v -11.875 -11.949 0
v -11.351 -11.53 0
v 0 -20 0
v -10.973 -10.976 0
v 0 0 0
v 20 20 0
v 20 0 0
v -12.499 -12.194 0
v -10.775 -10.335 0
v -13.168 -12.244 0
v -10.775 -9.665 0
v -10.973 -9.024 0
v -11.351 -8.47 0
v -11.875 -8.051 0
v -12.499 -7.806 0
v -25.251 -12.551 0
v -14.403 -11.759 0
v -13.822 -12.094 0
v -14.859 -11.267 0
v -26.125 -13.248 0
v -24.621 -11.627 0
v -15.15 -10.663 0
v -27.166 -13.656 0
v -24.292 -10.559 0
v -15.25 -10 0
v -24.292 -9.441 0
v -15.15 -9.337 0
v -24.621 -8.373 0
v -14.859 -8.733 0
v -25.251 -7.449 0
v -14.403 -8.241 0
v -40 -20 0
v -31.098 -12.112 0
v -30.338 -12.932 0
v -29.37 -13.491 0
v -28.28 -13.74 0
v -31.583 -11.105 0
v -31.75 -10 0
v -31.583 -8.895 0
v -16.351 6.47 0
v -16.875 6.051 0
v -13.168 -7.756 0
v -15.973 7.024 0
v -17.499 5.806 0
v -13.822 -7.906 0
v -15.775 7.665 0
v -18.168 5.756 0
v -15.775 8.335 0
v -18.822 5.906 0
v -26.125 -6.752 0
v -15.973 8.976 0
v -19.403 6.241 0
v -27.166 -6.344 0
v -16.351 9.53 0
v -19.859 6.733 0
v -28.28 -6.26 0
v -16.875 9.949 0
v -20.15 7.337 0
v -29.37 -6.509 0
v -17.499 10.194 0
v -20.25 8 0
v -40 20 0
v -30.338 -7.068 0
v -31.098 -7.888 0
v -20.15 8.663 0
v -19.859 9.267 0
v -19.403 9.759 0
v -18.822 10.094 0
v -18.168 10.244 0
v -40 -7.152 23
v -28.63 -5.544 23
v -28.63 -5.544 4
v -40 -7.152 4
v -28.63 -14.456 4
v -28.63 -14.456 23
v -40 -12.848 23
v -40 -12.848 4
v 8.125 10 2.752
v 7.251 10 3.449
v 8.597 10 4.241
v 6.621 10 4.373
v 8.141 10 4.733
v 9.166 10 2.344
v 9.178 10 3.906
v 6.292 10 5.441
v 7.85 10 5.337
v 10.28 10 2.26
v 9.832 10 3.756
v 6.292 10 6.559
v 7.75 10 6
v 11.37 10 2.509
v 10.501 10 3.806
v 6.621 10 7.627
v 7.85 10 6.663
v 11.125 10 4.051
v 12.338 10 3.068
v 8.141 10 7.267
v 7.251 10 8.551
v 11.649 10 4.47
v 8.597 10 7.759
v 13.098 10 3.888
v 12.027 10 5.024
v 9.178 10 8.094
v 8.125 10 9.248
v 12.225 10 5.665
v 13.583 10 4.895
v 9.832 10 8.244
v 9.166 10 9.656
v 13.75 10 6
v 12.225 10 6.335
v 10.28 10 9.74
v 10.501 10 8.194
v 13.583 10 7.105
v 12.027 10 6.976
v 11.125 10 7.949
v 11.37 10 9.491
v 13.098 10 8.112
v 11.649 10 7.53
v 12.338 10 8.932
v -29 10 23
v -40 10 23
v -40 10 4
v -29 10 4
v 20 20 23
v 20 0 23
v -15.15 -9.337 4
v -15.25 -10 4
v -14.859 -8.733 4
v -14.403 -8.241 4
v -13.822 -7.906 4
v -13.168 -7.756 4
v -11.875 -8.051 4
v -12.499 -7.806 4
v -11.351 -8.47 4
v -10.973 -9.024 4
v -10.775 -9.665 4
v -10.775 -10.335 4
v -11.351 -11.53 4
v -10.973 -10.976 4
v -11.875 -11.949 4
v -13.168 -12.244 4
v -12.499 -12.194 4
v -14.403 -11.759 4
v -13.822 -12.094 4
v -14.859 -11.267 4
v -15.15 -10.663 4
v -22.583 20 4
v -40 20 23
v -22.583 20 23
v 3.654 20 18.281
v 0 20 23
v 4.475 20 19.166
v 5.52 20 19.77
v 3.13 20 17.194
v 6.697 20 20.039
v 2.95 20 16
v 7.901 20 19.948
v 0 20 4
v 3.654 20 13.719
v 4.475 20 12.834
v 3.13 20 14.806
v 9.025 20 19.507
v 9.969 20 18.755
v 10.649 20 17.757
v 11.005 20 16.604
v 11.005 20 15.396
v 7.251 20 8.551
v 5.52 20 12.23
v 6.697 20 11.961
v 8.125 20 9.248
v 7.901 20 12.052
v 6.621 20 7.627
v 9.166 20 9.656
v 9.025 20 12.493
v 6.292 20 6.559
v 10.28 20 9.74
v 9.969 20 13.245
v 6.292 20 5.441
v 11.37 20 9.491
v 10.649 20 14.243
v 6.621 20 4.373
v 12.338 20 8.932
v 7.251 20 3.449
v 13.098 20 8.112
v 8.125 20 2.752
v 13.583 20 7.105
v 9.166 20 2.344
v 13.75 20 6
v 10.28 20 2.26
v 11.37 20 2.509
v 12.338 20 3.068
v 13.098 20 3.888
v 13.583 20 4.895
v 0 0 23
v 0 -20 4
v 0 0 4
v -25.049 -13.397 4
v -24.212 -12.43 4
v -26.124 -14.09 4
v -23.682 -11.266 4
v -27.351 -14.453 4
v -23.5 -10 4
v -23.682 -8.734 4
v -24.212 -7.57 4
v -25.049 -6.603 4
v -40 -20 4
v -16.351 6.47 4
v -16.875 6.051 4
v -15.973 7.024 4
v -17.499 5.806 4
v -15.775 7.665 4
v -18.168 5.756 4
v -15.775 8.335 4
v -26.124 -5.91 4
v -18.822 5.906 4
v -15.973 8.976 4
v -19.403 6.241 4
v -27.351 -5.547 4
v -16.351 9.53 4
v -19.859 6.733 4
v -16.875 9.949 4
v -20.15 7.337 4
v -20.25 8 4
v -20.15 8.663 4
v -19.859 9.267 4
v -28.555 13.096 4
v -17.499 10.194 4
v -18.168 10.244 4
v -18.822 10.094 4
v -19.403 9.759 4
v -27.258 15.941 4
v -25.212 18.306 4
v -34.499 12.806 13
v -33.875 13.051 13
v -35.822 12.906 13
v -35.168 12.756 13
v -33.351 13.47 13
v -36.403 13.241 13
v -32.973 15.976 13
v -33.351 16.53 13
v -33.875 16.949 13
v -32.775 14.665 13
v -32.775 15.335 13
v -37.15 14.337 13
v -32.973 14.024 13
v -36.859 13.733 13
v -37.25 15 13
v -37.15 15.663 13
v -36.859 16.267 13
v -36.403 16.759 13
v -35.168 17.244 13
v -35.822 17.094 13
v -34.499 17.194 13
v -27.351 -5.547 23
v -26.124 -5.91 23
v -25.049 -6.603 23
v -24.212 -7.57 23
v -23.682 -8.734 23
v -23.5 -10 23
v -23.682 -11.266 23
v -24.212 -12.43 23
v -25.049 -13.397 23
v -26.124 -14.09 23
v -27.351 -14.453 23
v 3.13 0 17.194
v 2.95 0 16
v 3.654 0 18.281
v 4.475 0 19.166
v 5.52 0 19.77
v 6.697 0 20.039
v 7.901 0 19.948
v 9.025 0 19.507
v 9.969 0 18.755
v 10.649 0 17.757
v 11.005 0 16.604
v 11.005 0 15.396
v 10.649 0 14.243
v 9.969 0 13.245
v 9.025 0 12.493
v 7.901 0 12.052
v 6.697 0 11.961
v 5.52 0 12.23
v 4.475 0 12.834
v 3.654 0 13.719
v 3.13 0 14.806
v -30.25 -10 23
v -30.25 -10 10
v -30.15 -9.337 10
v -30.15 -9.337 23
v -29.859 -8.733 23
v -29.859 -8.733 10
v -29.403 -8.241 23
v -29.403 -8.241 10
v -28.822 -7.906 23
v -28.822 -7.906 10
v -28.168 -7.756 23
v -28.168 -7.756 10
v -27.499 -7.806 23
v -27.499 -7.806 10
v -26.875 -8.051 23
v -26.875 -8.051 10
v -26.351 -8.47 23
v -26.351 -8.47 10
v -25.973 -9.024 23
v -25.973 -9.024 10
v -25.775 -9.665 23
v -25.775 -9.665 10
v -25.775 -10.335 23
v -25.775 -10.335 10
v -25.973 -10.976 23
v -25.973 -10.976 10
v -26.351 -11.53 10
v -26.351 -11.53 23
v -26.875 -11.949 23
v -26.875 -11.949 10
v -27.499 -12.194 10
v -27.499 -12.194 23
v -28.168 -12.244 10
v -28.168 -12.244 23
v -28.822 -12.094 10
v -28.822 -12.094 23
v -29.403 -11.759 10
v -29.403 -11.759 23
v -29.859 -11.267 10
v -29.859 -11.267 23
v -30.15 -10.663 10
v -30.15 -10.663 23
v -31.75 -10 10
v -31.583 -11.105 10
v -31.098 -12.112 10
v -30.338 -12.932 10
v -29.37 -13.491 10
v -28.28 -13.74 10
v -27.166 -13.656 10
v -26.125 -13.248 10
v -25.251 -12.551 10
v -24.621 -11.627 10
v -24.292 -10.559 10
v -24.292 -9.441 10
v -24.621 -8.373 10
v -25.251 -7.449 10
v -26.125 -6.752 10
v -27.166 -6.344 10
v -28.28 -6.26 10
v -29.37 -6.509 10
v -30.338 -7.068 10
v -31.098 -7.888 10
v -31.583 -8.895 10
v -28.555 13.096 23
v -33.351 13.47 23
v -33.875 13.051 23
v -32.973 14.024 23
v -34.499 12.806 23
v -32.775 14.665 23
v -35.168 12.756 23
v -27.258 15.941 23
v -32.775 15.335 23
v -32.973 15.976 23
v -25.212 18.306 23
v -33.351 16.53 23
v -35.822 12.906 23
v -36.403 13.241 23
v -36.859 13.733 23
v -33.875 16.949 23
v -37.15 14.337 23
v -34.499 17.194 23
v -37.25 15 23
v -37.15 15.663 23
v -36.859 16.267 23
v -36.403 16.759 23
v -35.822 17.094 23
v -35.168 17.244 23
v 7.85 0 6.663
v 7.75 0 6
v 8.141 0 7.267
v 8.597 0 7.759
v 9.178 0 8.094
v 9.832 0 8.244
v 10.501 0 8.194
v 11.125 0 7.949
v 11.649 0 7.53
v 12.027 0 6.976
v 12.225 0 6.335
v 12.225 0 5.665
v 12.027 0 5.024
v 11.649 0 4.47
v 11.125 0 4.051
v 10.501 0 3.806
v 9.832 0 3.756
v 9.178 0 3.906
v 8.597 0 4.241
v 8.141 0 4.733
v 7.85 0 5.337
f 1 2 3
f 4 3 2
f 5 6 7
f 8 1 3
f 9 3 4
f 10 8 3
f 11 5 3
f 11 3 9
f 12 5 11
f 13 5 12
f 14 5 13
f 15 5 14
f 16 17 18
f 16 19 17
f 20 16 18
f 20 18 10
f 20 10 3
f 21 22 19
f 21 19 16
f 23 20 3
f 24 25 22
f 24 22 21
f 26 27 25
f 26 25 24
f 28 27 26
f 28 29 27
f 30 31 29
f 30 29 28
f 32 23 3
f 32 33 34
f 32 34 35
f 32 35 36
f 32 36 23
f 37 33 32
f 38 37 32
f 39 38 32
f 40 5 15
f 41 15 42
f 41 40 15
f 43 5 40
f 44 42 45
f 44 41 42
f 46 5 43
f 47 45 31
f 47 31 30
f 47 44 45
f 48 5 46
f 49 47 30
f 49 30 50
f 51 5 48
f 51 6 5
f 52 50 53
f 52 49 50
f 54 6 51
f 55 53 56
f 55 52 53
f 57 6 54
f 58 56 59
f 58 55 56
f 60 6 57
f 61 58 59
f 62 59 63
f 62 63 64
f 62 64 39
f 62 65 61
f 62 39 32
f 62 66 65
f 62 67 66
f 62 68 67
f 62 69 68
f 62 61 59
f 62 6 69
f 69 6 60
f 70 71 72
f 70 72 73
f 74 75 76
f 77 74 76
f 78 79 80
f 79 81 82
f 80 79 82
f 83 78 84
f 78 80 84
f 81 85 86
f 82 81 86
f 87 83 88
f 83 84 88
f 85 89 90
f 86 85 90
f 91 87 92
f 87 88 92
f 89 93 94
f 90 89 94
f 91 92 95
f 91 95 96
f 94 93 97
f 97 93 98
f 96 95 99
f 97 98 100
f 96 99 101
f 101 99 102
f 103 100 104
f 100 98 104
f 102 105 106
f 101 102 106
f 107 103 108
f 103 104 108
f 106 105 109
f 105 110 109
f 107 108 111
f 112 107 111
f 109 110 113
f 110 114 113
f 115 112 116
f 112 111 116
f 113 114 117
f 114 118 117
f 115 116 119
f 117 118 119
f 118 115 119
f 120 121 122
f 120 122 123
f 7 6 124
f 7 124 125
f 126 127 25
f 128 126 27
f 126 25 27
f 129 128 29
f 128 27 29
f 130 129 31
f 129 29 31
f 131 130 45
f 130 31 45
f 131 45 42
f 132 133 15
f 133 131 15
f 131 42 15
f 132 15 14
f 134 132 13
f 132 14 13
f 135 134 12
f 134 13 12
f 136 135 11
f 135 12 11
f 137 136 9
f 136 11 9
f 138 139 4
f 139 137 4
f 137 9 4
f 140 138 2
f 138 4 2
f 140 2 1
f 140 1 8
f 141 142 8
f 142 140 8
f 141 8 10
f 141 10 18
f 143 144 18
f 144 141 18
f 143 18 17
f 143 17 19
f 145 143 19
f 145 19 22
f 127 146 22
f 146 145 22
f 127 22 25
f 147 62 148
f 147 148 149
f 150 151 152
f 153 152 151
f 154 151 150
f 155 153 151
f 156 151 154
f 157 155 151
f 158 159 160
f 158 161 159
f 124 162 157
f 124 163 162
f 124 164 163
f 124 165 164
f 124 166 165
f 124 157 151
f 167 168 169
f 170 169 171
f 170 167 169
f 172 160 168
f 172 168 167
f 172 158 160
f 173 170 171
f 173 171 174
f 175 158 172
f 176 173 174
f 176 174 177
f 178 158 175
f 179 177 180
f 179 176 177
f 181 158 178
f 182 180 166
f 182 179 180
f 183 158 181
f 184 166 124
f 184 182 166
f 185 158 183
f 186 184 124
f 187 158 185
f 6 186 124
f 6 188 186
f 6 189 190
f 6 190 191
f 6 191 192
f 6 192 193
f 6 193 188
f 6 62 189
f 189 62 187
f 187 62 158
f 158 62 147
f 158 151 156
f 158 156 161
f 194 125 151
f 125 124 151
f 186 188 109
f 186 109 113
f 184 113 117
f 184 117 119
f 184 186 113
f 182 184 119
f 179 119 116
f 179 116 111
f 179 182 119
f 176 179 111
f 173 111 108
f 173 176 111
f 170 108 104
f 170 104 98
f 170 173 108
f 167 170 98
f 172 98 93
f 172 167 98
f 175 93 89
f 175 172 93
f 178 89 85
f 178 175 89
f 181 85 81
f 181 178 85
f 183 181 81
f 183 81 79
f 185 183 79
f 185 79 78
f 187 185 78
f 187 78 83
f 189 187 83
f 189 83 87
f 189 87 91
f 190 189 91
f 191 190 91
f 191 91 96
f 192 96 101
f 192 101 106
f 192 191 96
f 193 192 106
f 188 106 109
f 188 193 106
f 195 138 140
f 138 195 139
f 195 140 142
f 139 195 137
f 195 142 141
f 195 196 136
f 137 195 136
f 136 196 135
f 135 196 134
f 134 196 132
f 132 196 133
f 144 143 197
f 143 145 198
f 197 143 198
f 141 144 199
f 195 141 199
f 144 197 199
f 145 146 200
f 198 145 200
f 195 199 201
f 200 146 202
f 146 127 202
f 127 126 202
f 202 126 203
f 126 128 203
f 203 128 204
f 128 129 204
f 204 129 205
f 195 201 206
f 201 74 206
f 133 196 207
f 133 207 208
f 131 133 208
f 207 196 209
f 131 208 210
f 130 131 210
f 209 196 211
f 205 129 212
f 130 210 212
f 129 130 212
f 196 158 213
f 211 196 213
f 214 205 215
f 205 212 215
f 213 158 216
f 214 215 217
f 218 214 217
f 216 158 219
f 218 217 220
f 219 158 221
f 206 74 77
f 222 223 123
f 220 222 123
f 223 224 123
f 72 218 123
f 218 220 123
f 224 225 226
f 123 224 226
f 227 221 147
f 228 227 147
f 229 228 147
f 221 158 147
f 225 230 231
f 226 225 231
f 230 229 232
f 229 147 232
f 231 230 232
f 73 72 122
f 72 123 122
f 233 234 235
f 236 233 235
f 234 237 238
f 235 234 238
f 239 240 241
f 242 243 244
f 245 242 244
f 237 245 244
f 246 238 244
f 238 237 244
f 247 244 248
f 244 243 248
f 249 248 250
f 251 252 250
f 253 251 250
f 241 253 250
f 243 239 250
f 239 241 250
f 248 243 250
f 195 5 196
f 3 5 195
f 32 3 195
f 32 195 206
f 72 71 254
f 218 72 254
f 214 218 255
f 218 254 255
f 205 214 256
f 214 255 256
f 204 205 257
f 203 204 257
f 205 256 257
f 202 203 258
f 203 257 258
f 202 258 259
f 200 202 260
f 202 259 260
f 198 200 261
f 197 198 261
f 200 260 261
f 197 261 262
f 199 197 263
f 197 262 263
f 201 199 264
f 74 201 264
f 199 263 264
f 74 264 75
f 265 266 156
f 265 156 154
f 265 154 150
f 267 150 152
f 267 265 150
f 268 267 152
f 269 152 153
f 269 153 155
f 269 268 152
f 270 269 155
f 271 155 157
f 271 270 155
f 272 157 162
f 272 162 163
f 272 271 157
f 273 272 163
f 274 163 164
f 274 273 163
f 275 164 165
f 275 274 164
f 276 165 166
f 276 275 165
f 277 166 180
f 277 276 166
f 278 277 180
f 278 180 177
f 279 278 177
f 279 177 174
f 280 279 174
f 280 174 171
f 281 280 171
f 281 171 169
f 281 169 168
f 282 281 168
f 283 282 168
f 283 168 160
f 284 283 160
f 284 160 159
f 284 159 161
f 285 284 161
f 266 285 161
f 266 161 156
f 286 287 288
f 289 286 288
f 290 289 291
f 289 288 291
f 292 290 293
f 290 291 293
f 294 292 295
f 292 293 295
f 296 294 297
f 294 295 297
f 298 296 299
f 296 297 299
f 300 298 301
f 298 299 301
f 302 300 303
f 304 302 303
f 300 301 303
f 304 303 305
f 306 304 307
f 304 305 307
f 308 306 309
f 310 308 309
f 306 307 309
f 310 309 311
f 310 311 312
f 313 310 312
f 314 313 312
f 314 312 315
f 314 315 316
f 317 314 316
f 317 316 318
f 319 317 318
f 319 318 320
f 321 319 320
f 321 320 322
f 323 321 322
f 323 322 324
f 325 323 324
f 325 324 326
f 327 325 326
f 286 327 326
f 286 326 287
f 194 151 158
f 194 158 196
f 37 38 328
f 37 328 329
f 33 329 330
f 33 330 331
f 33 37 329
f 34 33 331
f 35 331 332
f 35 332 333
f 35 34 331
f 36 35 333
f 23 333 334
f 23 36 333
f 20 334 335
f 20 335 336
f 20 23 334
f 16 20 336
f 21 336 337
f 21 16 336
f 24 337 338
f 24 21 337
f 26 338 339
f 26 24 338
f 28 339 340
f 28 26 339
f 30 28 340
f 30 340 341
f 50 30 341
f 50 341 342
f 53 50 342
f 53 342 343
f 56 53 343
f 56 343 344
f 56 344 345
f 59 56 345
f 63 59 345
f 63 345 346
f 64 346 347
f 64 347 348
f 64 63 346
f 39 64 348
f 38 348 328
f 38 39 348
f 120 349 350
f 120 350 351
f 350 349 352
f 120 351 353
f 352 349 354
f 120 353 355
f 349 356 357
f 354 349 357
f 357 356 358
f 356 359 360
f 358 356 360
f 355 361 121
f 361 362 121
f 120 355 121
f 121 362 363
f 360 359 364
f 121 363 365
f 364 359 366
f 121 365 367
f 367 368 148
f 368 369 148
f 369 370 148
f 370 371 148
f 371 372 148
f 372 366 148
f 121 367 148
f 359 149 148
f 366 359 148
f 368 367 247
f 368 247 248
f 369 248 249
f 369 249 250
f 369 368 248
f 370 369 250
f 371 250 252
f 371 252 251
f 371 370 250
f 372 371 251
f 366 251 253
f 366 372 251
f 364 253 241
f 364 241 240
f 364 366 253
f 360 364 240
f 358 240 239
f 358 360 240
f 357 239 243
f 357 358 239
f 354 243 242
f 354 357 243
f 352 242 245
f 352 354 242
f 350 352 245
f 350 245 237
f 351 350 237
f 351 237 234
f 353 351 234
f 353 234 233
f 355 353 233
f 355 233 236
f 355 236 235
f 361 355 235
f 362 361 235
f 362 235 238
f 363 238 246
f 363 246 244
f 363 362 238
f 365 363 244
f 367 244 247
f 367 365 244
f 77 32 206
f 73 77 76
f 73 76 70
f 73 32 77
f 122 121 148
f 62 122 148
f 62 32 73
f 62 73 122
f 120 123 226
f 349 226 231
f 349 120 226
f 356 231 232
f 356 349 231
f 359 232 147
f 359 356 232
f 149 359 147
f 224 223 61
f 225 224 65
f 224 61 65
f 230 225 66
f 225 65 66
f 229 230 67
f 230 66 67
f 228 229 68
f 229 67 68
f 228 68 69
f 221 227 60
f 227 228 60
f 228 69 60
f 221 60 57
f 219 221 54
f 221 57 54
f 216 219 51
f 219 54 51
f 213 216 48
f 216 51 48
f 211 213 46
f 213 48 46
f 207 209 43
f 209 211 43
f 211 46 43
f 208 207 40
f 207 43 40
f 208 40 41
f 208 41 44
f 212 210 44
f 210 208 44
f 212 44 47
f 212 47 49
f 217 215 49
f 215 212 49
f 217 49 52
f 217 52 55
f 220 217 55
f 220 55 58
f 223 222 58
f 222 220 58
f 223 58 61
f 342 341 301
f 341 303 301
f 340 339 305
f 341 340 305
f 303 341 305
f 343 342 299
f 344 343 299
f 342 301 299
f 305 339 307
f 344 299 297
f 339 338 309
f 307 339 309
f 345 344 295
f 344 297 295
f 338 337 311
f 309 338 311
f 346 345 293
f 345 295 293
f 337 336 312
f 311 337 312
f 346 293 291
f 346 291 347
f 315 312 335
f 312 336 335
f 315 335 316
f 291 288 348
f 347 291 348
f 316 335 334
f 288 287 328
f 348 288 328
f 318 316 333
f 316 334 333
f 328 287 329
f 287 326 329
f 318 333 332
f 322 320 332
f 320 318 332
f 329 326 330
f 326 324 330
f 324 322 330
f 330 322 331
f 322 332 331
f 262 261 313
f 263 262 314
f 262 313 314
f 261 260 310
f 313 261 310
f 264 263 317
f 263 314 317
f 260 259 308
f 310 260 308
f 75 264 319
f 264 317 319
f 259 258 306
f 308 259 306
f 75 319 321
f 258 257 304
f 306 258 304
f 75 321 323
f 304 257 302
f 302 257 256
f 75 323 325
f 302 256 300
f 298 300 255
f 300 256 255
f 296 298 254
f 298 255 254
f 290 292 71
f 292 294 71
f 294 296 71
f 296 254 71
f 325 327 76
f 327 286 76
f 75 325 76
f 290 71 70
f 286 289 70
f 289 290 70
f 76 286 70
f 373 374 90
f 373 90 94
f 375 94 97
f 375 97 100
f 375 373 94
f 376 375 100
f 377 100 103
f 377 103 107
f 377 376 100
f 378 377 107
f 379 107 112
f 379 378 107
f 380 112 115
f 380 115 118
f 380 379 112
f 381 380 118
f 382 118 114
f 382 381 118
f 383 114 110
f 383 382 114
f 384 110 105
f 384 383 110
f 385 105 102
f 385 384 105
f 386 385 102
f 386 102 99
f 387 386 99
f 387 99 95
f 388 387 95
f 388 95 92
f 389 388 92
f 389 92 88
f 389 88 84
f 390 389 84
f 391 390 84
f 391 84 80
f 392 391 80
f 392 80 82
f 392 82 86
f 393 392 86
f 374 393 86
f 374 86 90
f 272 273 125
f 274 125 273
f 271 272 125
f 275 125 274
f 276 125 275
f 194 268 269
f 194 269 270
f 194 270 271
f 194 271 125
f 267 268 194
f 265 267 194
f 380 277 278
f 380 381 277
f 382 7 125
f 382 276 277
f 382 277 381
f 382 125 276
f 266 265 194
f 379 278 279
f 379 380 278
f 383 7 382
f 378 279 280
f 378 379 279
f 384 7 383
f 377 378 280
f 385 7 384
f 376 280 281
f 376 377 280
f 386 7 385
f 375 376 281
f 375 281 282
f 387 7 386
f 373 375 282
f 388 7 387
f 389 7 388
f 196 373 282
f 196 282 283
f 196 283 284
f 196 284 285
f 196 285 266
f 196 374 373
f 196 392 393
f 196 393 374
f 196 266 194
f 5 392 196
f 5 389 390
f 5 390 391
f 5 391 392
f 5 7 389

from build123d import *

# Parameters (mm, degrees)
SKETCH_R        = 2.25
PAD_DEPTH       = 23
POCKET_DEPTH    = 19
SKETCH002_R     = 4.05
SKETCH002_R_2   = 2.25
POCKET001_DEPTH = 20.001
SKETCH003_R     = 2.25
POCKET002_DEPTH = 10
SKETCH004_R     = 3.75
POCKET003_DEPTH = 10
SKETCH005_R     = 3.75
POCKET004_DEPTH = 10


with BuildPart() as pocket004:
    # Sketch → Pad (new body)
    with BuildSketch(Plane.XY):
        Polygon((0, -20), (40, -20), (40, 20), (-20, 20), (-20, 0), (0, 0), align=None)
        with Locations((18, 8)):
            Circle(SKETCH_R, mode=Mode.SUBTRACT)
        with Locations((13, -10)):
            Circle(SKETCH_R, mode=Mode.SUBTRACT)
        with Locations((28, -10)):
            Circle(SKETCH_R, mode=Mode.SUBTRACT)
    extrude(amount=PAD_DEPTH)

    # Sketch001 → Pocket (cut)
    with BuildSketch(Plane.XY.offset(23)):
        with BuildLine():
            Line((46, 10), (29, 10))
            ThreePointArc((29, 10), (25.778159, 17.77819), (17.999956, 21))
            Line((17.999956, 21), (0, 21))
            Line((0, 21), (0, -23))
            Line((0, -23), (46, -23))
            Line((46, -23), (46, -12))
            Line((28.629923, -14.455693), (46, -12))
            ThreePointArc((28.629923, -5.544307), (23.5, -10), (28.629923, -14.455693))
            Line((28.629923, -5.544307), (46, -8))
            Line((46, -8), (46, 10))
        make_face()
    extrude(amount=-POCKET_DEPTH, mode=Mode.SUBTRACT)

    # Sketch002 → Pocket001 (cut, through all)
    with BuildSketch(Plane.XZ):
        with Locations((-7, 16)):
            Circle(SKETCH002_R)
        with Locations((-10, 6)):
            Circle(SKETCH002_R_2)
    extrude(amount=-POCKET001_DEPTH, mode=Mode.SUBTRACT)

    # Sketch003 → Pocket002 (cut)
    with BuildSketch(Plane.XY.offset(23)):
        with Locations((35, 15)):
            Circle(SKETCH003_R)
    extrude(amount=-POCKET002_DEPTH, mode=Mode.SUBTRACT)

    # Sketch004 → Pocket003 (cut)
    with BuildSketch(Plane(origin=(0, 20, 0), x_dir=(-1, 0, 0), z_dir=(0, 1, 0))):
        with Locations((10, 6)):
            Circle(SKETCH004_R)
    extrude(amount=-POCKET003_DEPTH, mode=Mode.SUBTRACT)

    # Sketch005 → Pocket004 (cut)
    with BuildSketch(Plane(origin=(0, 0, 0), x_dir=(1, 0, 0), z_dir=(0, 0, -1))):
        with Locations((28, 10)):
            Circle(SKETCH005_R)
    extrude(amount=-POCKET004_DEPTH, mode=Mode.SUBTRACT)


with BuildPart() as part_mirroring:
    # Part__Mirroring: instance of Pocket004
    add(pocket004.part.mirror(Plane(origin=(0, 0, 0), x_dir=(0, -1, 0), z_dir=(1, 0, 0))))


solid = part_mirroring.part
